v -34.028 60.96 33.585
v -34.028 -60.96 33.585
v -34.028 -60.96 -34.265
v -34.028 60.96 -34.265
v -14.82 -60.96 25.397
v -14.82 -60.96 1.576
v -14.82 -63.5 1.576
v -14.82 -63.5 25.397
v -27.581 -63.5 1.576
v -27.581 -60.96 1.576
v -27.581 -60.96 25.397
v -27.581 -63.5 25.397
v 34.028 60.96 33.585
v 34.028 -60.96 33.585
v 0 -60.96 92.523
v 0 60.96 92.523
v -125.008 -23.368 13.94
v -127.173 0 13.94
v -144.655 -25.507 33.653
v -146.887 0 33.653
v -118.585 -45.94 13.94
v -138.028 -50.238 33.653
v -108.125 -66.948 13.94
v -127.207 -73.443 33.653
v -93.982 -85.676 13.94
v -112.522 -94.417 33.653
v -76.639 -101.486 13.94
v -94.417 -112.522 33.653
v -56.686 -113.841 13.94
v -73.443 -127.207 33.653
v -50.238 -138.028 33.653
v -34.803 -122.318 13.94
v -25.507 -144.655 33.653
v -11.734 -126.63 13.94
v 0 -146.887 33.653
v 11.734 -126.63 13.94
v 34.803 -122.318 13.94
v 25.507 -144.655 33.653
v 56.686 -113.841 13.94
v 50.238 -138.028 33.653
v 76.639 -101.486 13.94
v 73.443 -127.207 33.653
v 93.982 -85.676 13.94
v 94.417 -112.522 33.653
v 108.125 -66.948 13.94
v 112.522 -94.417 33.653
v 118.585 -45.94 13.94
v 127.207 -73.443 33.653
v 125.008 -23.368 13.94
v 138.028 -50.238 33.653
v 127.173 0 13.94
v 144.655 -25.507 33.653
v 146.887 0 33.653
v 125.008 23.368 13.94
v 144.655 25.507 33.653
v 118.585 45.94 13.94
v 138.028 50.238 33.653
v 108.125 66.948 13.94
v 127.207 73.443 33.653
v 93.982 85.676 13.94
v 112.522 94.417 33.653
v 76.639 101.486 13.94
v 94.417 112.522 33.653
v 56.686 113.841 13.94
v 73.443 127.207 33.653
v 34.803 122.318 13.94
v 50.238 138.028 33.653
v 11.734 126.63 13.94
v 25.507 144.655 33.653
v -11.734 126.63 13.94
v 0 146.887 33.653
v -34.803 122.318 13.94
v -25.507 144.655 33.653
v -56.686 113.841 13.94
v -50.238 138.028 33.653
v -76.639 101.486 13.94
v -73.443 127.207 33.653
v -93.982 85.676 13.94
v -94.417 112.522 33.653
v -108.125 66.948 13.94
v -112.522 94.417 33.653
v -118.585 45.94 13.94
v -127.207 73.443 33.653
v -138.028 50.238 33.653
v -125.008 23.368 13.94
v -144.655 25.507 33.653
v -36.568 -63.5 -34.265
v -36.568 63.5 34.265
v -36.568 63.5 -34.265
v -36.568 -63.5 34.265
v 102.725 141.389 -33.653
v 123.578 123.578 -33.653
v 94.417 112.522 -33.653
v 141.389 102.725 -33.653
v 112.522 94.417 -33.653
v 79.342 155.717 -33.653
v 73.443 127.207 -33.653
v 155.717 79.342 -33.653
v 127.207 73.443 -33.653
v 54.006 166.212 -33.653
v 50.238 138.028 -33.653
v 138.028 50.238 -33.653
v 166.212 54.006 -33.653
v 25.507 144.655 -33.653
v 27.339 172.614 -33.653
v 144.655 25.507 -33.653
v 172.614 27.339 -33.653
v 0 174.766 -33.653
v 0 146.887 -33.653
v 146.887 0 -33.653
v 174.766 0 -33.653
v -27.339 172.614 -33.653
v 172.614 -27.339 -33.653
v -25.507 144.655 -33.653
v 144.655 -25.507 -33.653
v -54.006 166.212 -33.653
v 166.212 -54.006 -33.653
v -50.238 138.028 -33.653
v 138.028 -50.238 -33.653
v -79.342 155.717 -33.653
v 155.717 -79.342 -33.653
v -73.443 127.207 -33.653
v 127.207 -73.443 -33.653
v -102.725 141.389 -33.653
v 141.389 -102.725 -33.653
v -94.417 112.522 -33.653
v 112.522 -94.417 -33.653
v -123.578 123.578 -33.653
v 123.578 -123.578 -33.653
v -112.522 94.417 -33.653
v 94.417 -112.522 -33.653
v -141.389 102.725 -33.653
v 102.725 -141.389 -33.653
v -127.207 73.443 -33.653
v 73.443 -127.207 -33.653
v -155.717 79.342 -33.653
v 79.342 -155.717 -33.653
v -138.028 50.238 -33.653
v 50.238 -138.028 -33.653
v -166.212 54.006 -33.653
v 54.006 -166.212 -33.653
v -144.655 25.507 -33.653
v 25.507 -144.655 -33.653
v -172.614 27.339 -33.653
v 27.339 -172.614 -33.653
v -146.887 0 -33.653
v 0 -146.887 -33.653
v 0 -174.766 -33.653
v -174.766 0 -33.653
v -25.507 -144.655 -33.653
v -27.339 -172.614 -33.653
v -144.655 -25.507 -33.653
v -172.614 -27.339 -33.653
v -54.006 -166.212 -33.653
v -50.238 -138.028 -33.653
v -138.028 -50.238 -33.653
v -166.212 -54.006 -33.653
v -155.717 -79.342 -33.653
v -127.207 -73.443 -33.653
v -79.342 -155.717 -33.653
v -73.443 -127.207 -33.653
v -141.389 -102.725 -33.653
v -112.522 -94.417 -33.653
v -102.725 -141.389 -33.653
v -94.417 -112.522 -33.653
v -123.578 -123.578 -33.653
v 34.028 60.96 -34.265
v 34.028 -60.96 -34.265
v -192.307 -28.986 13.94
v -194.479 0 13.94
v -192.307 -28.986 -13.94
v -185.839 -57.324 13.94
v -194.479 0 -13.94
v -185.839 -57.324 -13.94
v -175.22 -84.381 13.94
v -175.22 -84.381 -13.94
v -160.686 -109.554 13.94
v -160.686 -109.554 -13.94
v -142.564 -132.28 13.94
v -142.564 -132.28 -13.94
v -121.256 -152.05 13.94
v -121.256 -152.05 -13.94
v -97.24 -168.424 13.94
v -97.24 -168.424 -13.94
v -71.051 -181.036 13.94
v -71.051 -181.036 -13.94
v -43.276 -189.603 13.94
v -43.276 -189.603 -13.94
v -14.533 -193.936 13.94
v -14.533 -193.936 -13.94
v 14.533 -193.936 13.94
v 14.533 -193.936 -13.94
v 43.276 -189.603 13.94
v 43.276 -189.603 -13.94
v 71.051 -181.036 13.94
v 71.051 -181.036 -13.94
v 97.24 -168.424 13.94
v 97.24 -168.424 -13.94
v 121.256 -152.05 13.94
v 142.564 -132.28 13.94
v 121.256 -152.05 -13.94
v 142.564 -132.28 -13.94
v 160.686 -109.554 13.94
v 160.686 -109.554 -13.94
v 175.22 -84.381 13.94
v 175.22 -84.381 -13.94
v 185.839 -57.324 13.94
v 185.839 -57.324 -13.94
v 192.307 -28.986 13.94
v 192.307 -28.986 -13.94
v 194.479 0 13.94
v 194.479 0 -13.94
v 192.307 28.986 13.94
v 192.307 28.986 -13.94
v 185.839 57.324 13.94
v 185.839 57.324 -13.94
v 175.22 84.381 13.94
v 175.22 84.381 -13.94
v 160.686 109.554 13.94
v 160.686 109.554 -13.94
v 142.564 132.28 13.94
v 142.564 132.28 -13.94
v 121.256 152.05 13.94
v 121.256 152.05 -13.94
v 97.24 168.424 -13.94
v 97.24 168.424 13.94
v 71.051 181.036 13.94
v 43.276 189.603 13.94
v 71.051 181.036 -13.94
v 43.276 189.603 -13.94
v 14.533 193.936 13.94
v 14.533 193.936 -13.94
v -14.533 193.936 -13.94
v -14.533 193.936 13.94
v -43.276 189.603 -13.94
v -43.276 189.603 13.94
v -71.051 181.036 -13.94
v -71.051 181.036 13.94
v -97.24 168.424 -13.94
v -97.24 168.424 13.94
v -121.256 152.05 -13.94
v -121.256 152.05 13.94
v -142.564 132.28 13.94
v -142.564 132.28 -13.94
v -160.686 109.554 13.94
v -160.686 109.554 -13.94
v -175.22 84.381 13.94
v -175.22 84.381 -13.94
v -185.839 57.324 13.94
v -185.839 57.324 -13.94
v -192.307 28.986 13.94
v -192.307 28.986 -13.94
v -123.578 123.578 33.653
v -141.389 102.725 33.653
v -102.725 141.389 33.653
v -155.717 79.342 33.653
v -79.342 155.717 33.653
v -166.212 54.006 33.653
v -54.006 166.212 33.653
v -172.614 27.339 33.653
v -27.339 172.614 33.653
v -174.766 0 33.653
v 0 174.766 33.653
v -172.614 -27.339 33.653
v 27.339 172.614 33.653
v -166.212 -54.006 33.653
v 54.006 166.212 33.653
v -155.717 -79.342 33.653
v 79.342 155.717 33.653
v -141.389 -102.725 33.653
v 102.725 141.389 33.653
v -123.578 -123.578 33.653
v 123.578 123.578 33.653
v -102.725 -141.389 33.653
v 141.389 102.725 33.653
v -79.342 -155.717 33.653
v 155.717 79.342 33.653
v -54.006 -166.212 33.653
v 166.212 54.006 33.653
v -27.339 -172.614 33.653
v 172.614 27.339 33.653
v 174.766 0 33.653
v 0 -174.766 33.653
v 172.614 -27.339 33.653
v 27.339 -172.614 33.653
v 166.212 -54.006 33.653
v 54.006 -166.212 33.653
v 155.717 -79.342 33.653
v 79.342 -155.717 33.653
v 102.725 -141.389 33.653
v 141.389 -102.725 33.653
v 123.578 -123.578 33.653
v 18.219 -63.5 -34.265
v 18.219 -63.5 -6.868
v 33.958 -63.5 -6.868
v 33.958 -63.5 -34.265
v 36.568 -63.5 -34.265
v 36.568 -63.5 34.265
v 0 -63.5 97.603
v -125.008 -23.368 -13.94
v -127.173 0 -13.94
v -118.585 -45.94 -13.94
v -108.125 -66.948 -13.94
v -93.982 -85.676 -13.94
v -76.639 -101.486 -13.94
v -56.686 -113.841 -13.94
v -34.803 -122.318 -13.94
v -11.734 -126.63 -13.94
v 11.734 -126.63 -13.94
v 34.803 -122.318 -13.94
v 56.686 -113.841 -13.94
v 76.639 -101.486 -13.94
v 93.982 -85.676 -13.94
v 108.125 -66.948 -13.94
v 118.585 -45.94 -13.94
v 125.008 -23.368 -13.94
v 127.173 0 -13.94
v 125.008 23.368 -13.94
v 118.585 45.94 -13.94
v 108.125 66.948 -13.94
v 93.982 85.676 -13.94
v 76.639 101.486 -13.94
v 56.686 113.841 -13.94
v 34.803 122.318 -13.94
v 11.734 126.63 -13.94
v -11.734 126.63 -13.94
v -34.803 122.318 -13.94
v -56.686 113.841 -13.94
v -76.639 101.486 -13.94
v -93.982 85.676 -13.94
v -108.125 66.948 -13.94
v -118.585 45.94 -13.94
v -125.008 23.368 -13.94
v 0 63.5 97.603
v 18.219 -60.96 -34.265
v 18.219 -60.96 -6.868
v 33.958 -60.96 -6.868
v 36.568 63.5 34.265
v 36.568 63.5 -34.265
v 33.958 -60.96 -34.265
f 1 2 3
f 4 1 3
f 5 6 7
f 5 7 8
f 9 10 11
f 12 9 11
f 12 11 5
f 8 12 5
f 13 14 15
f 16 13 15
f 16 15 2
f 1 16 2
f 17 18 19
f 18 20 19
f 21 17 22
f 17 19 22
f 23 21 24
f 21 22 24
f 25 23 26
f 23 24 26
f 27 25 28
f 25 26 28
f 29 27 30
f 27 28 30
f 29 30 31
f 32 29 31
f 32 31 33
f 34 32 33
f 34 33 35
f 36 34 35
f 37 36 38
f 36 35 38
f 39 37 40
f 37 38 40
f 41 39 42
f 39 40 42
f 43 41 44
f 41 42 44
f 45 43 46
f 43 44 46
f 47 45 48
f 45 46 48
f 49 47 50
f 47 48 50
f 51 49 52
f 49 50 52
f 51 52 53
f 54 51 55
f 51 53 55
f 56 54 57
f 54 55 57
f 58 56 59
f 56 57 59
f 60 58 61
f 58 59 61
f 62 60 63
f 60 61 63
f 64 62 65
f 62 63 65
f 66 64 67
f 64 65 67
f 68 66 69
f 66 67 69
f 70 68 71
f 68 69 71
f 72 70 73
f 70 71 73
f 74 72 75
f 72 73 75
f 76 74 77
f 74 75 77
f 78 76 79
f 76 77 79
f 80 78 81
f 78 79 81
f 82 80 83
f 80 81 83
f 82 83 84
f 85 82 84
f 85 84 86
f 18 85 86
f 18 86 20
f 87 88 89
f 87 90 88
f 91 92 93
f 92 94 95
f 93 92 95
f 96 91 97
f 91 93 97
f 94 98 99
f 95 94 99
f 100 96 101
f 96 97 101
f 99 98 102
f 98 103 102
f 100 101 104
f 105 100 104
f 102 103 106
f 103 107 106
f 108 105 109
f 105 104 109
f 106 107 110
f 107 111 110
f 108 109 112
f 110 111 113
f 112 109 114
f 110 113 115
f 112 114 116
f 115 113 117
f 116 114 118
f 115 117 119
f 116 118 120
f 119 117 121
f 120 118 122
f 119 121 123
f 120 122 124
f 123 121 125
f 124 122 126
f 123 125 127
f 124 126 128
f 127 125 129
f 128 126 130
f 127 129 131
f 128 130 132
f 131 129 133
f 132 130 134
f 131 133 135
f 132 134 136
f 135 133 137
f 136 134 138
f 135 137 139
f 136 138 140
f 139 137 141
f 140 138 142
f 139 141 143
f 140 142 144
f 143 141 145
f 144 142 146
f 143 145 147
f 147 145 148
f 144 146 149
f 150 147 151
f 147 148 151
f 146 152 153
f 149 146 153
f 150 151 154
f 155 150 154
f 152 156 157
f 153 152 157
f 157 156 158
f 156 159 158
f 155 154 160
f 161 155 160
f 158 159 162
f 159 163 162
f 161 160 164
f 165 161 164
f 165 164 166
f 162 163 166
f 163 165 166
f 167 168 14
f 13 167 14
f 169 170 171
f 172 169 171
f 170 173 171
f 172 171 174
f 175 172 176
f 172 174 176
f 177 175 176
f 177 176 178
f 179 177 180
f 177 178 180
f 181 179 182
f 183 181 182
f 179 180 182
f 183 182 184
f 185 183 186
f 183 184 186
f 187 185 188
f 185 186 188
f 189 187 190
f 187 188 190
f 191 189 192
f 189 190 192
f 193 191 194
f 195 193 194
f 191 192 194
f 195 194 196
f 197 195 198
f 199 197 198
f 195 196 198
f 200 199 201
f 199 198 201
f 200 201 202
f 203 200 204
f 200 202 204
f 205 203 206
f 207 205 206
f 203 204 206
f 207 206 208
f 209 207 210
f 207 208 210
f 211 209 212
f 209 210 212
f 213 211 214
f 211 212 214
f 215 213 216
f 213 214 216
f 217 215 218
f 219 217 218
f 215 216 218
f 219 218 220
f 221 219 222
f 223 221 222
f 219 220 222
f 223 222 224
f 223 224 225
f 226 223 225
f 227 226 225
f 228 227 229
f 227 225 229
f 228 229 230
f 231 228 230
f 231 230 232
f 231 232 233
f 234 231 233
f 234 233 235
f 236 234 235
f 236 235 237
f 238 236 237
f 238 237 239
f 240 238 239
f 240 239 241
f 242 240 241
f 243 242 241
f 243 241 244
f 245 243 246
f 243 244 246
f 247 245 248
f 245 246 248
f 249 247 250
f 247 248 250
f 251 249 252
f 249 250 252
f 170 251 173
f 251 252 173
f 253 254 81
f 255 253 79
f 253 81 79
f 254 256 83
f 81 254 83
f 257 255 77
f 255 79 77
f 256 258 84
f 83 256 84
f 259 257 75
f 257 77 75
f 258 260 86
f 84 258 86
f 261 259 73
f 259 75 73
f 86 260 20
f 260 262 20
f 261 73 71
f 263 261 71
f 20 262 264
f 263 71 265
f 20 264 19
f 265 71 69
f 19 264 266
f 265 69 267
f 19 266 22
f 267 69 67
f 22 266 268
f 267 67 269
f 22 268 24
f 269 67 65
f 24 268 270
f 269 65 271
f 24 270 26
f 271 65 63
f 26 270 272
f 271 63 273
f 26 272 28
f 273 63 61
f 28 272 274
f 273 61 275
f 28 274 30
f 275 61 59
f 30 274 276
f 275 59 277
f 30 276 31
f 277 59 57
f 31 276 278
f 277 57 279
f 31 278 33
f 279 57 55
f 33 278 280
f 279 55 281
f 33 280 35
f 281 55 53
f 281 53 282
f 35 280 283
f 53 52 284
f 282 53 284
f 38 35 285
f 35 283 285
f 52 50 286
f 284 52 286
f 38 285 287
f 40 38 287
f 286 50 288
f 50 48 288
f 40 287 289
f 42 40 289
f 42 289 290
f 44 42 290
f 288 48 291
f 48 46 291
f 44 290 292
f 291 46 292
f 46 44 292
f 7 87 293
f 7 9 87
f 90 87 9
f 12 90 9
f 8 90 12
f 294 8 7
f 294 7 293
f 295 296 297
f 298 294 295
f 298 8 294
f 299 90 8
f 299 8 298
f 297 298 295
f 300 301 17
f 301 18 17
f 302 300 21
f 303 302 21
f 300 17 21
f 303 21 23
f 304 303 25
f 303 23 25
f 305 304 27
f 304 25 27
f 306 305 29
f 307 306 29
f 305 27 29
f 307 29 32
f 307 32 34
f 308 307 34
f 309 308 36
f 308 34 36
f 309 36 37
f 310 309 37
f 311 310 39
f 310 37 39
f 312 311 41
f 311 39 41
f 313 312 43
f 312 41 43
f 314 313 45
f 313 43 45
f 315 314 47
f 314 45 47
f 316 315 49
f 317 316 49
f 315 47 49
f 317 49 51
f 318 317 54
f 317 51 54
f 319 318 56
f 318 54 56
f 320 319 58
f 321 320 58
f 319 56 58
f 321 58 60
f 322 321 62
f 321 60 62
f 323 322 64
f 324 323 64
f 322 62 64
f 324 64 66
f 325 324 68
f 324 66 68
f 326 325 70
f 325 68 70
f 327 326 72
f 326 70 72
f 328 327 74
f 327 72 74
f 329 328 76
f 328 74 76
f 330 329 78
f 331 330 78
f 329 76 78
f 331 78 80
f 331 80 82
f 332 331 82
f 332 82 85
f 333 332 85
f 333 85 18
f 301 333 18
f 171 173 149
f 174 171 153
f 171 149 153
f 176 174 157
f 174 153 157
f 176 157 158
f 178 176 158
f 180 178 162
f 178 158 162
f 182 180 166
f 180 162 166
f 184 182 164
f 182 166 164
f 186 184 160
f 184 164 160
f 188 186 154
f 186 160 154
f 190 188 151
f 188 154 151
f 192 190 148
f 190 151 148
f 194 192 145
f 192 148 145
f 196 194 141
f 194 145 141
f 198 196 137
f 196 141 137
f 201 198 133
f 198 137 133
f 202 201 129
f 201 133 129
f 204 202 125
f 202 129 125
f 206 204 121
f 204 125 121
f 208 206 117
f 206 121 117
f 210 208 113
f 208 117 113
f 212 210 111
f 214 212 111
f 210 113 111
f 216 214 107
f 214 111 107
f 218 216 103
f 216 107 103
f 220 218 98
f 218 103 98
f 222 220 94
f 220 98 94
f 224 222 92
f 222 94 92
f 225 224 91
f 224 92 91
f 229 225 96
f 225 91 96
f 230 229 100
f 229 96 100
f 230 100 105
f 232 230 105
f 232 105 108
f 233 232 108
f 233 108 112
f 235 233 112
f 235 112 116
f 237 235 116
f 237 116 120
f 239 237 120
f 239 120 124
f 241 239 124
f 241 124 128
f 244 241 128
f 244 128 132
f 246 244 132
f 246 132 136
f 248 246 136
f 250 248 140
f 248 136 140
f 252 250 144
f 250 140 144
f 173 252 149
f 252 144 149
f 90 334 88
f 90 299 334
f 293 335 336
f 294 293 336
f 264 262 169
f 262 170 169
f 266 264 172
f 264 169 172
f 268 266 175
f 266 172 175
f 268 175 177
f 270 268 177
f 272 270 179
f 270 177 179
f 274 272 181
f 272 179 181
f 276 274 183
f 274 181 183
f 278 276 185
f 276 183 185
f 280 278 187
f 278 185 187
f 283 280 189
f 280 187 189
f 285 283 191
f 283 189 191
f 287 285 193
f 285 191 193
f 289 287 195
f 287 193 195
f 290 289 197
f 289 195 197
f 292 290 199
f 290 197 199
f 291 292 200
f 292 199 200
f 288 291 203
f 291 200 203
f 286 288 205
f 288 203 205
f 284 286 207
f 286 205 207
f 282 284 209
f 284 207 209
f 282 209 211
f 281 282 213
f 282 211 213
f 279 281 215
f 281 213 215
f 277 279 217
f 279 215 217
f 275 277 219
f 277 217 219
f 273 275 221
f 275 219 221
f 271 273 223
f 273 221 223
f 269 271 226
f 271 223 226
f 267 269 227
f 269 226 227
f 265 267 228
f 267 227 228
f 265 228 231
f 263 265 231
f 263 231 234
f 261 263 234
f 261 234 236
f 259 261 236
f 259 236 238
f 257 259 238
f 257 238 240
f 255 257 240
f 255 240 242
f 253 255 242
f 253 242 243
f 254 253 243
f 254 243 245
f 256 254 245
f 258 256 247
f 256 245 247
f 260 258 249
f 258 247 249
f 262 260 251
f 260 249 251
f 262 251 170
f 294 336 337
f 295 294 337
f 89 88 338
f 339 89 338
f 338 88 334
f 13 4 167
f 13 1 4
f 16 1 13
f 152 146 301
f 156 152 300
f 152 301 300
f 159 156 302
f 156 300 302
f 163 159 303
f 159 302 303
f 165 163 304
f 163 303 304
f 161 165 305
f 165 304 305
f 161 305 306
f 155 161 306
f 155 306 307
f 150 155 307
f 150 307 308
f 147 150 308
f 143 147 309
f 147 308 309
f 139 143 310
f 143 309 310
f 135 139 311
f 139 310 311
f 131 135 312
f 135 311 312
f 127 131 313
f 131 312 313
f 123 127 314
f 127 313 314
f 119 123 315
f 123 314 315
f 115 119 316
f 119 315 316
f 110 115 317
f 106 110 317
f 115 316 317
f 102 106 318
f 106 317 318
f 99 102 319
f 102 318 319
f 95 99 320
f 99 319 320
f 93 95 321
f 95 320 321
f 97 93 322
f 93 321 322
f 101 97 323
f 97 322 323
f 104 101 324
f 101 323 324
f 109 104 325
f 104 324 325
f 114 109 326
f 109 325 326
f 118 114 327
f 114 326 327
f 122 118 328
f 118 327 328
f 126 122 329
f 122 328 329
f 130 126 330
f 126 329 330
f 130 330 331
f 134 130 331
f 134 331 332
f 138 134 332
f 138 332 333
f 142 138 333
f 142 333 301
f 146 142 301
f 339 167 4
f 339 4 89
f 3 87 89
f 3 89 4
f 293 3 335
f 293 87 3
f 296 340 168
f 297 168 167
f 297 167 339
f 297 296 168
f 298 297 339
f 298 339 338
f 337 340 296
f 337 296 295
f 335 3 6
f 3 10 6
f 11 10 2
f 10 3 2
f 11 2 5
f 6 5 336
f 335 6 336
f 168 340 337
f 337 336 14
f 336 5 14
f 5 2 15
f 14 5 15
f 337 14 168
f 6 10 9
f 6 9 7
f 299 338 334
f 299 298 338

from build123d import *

# Parameters (mm, degrees)
F0_W     = 12.7614177763
F0_H     = 23.8213203847
F0_W_2   = 15.7390795648
F0_H_2   = 27.3968875408
F1_DEPTH = 63.5
F2_T     = -2.54
F3_DEPTH = 63.5


with BuildPart() as f1:
    # F0 (on Front) → F1 (new body, symmetric)
    with BuildSketch(Plane.XZ):
        Polygon((-36.5679125852, 34.2651693315), (-36.5679125852, -34.2651693315), (18.2191394269, -34.2651693315), (18.2191394269, -6.8682817907), (33.9582189918, -6.8682817907), (33.9582189918, -34.2651693315), (36.5679125852, -34.2651693315), (36.5679125852, 34.2651693315), (0, 97.6026518557), align=None)
        with Locations((-21.200472489, 13.4865129367)):
            Rectangle(F0_W, F0_H, mode=Mode.SUBTRACT)
        with Locations((26.0886792094, -20.5667255611)):
            Rectangle(F0_W_2, F0_H_2)
        with Locations((-21.200472489, 13.4865129367)):
            Rectangle(F0_W, F0_H)
    extrude(amount=F1_DEPTH, both=True)

    # F2
    f2_openings = [f1.faces().sort_by_distance(p)[0] for p in [
        (0, 0, -34.265169),
    ]]
    offset(amount=F2_T, openings=f2_openings)

    # F0 (on Front) → F3 (cut, through all)
    with BuildSketch(Plane.XZ):
        with Locations((-21.200472489, 13.4865129367)):
            Rectangle(F0_W, F0_H)
        with Locations((26.0886792094, -20.5667255611)):
            Rectangle(F0_W_2, F0_H_2)
    extrude(amount=F3_DEPTH, mode=Mode.SUBTRACT)


with BuildPart() as f5:
    # F4 (on Front) → F5 (revolve)
    with BuildSketch(Plane.XZ):
        Polygon((-146.8865556031, -33.6532549442), (-127.1729352748, -13.9396346159), (-127.1729352748, 13.9396346159), (-146.8865556031, 33.6532549442), (-174.7658248349, 33.6532549442), (-194.4794451632, 13.9396346159), (-194.4794451632, -13.9396346159), (-174.7658248349, -33.6532549442), align=None)
    revolve(axis=Axis((0, 0, 48.9743426442), (0, 0, 1)))


solid = Compound([f1.part, f5.part])
